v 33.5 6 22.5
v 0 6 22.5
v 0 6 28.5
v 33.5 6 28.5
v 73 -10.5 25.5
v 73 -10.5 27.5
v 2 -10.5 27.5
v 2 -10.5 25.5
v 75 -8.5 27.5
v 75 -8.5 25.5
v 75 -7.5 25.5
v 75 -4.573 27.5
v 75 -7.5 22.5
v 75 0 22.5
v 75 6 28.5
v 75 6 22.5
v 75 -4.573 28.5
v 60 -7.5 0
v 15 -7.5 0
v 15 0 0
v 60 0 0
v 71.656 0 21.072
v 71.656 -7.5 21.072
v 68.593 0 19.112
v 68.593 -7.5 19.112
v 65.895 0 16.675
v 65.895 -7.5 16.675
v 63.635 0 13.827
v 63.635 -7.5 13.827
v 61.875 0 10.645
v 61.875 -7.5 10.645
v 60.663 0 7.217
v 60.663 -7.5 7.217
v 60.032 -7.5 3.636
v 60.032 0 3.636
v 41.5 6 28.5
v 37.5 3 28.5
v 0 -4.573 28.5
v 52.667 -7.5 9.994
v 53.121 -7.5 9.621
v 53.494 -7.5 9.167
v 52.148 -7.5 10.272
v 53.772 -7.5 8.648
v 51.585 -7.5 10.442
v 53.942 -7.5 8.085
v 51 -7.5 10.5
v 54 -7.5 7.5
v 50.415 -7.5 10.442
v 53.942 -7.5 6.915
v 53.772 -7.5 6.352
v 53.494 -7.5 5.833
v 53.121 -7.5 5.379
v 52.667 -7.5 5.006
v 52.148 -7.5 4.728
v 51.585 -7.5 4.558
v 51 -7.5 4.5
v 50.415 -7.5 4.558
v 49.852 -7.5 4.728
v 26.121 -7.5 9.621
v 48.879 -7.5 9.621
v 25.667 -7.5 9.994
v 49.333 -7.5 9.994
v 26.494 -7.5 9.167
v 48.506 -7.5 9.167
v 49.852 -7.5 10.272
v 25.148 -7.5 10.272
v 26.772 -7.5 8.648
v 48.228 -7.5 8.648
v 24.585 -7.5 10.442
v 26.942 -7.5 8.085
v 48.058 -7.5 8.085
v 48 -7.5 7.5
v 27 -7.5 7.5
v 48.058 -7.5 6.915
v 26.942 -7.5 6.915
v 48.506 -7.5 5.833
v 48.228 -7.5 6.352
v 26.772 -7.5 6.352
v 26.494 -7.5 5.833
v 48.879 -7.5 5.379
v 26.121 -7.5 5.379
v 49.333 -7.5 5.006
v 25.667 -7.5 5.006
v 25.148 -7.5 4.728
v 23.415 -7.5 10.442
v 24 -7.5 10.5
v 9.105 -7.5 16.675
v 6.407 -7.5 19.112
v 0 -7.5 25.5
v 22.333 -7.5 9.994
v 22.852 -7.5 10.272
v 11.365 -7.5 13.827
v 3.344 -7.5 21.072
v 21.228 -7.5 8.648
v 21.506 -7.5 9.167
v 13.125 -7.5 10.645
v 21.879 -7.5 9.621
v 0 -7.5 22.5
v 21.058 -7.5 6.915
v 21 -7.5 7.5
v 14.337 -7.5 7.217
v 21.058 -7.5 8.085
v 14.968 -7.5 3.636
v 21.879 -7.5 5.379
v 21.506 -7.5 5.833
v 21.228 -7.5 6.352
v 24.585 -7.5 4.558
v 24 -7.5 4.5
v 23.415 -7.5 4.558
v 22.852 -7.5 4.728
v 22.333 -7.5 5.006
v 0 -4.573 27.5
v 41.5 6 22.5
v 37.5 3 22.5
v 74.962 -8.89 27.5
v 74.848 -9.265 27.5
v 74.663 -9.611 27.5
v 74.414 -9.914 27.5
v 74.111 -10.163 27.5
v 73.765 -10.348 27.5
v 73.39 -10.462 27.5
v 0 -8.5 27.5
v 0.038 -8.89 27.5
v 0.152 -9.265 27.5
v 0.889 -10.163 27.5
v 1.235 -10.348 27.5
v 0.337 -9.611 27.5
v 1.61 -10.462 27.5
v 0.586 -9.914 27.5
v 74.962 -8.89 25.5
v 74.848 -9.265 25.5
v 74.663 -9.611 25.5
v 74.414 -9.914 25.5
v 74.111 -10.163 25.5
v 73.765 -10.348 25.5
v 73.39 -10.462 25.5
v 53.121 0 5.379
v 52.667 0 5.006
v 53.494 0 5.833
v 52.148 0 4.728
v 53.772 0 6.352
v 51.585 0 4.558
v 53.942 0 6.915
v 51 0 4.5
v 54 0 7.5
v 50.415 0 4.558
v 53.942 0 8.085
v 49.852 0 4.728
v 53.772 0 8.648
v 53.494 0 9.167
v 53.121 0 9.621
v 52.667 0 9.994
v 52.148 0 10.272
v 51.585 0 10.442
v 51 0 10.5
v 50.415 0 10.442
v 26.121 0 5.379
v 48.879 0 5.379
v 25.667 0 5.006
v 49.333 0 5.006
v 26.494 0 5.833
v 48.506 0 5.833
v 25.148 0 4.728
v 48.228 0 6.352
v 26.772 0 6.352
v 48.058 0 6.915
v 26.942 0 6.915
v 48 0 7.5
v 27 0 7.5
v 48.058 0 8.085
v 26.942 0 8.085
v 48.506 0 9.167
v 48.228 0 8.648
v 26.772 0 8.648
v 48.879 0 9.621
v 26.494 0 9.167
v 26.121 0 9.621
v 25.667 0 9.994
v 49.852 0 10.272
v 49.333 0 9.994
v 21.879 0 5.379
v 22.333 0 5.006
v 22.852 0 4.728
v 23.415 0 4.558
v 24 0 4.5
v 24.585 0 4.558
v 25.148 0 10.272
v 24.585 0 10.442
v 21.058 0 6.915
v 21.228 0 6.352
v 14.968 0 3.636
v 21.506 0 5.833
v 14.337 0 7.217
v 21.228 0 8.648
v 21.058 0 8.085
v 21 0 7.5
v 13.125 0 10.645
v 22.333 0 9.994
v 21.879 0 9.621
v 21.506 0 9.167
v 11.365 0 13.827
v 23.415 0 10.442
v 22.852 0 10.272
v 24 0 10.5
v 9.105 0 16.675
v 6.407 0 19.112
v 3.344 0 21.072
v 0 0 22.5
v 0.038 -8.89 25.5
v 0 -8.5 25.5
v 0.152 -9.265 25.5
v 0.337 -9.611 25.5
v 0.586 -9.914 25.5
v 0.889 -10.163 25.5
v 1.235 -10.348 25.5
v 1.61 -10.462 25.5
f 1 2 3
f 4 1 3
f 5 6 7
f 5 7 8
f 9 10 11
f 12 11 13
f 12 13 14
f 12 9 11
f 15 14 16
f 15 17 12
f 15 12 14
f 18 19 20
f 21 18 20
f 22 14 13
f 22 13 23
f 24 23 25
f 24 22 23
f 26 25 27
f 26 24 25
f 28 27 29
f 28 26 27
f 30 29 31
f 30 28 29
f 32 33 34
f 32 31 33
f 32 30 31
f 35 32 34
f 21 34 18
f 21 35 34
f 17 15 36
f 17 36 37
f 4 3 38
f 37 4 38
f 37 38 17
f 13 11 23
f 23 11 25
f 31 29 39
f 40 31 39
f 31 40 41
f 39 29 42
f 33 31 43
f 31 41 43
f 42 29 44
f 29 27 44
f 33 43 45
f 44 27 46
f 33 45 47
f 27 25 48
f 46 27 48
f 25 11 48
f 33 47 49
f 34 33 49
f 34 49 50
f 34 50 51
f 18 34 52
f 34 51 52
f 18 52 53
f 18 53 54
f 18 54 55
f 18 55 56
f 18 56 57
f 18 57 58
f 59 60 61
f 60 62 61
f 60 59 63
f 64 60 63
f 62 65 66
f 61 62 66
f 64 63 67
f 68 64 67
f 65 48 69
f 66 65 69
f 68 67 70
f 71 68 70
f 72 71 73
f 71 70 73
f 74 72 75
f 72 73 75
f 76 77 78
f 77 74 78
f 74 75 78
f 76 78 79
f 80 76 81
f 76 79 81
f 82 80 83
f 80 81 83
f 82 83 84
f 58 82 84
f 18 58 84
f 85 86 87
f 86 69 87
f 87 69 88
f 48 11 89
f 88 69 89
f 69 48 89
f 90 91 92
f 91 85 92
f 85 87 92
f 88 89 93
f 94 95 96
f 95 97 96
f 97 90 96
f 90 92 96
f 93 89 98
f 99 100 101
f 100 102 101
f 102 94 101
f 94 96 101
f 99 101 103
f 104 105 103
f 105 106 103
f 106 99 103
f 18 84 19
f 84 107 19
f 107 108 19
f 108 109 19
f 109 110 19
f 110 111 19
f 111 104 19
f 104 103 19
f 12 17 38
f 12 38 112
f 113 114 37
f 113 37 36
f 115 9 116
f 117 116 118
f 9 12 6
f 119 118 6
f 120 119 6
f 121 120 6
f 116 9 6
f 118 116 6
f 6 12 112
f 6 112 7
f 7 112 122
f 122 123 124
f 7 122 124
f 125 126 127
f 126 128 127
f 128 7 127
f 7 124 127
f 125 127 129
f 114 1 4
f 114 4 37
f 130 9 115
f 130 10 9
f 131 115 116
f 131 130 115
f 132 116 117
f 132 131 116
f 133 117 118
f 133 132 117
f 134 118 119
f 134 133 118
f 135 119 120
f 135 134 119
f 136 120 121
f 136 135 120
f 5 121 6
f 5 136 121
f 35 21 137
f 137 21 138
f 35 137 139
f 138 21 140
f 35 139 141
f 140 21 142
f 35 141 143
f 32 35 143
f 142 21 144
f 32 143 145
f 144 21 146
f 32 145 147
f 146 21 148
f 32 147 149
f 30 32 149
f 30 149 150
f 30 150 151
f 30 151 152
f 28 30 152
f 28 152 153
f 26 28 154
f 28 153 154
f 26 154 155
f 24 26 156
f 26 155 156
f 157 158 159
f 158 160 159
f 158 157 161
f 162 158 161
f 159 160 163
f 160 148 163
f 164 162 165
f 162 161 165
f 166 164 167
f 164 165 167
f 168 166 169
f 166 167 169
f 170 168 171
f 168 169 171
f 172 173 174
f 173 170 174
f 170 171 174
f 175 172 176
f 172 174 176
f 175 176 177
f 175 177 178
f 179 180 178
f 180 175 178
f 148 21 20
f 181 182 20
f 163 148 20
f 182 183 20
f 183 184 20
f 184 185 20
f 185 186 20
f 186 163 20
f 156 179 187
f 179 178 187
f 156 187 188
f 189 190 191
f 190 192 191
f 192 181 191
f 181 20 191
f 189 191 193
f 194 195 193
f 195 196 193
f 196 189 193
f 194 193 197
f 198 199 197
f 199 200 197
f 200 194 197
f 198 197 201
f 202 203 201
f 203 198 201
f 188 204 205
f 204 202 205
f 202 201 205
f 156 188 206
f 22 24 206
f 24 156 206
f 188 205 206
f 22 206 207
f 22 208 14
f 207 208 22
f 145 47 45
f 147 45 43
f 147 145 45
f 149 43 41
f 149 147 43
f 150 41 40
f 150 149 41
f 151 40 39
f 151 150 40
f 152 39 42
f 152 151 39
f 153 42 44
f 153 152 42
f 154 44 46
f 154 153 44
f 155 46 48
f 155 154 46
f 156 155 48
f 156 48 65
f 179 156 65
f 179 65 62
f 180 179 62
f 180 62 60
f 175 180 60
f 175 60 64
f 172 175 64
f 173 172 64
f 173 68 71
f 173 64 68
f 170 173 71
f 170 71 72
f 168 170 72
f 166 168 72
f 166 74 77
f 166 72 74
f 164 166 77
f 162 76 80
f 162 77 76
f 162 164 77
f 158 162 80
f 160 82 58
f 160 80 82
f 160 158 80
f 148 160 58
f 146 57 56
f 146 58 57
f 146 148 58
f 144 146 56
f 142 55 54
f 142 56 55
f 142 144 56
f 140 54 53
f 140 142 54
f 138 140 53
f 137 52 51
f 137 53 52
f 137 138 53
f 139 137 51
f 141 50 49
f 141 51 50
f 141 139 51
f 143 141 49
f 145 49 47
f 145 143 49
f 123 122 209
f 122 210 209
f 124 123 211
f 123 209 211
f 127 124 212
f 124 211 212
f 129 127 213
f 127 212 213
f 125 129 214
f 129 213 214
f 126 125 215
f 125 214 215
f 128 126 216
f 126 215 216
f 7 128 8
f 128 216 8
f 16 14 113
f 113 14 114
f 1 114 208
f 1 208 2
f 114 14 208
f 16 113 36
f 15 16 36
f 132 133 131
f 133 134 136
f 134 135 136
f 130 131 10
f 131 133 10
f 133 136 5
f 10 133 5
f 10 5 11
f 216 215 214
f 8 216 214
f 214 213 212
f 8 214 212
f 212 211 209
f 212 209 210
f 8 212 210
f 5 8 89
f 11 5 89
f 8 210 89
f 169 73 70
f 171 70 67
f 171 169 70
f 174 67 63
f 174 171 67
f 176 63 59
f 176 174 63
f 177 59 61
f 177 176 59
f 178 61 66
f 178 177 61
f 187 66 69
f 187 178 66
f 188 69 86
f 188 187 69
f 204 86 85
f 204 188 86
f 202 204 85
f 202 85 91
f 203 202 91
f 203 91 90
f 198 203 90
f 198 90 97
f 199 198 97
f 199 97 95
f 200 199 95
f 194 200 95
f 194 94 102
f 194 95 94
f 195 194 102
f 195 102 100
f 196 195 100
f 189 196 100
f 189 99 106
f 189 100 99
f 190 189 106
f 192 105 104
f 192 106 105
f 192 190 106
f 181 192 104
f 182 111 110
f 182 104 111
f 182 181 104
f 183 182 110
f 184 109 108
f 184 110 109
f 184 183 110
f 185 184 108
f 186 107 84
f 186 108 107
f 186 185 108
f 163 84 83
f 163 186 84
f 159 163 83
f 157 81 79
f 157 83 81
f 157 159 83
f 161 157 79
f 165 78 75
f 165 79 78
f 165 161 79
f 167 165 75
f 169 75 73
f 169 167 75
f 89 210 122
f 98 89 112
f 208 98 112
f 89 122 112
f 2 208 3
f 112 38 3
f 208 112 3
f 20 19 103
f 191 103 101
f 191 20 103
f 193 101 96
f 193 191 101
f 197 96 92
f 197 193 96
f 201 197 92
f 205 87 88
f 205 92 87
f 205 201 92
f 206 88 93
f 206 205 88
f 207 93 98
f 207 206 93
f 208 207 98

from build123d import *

# Parameters (mm, degrees)
F1_DEPTH      = 75
F4_DEPTH      = 25
F4_DEPTH_BACK = 25
F5_R          = 3
F6_DEPTH      = 25
F6_DEPTH_BACK = 25
F7_R          = 2
F9_DEPTH      = 50


with BuildPart() as f1:
    # F0 (on Right) → F1 (new body)
    with BuildSketch(Plane.YZ):
        Polygon((-7.5, 0), (0, 0), (0, 22.5), (6, 22.5), (6, 28.5), (-4.5733697172, 28.5), (-4.5733697172, 27.5), (-10.5, 27.5), (-10.5, 25.5), (-7.5, 25.5), align=None)
    extrude(amount=F1_DEPTH)

    # F2 (on Front) → F4 (cut, two sides)
    with BuildSketch(Plane.XZ) as f4_sk:
        with BuildLine():
            Line((18.9505368471, -15.0200538337), (15, 0))
            ThreePointArc((15, 0), (11.3650779756, 13.8267186504), (0, 22.5))
            Line((0, 22.5), (-15.862300992, 22.5))
            Line((-15.862300992, 22.5), (-15.862300992, -15.0200538337))
            Line((-15.862300992, -15.0200538337), (18.9505368471, -15.0200538337))
        make_face()
        with BuildLine():
            Line((90.862300992, 22.5), (75, 22.5))
            ThreePointArc((75, 22.5), (63.6349220244, 13.8267186504), (60, 0))
            Line((60, 0), (56.0494631529, -15.0200538337))
            Line((56.0494631529, -15.0200538337), (90.862300992, -15.0200538337))
            Line((90.862300992, -15.0200538337), (90.862300992, 22.5))
        make_face()
    extrude(amount=-F4_DEPTH, mode=Mode.SUBTRACT)
    extrude(f4_sk.sketch, amount=F4_DEPTH_BACK, mode=Mode.SUBTRACT)

    # F5 (on Front) → F6 (cut, two sides)
    with BuildSketch(Plane.XZ) as f6_sk:
        with Locations((24, 7.5)):
            Circle(F5_R)
        with Locations((51, 7.5)):
            Circle(F5_R)
    extrude(amount=F6_DEPTH, mode=Mode.SUBTRACT)
    extrude(f6_sk.sketch, amount=-F6_DEPTH_BACK, mode=Mode.SUBTRACT)

    # F7
    f7_edges = [f1.edges().sort_by_distance(p)[0] for p in [
        (75, -10.5, 26.5),
        (0, -10.5, 26.5),
    ]]
    fillet(f7_edges, radius=F7_R)

    # F8 (on Top) → F9 (cut)
    with BuildSketch(Plane.XY):
        Polygon((32.4930176139, 11.9444662705), (33.5, 6), (37.5, 3), (41.5, 6), (50.5435075659, 15.0021882955), align=None)
    extrude(amount=F9_DEPTH, mode=Mode.SUBTRACT)


solid = f1.part
